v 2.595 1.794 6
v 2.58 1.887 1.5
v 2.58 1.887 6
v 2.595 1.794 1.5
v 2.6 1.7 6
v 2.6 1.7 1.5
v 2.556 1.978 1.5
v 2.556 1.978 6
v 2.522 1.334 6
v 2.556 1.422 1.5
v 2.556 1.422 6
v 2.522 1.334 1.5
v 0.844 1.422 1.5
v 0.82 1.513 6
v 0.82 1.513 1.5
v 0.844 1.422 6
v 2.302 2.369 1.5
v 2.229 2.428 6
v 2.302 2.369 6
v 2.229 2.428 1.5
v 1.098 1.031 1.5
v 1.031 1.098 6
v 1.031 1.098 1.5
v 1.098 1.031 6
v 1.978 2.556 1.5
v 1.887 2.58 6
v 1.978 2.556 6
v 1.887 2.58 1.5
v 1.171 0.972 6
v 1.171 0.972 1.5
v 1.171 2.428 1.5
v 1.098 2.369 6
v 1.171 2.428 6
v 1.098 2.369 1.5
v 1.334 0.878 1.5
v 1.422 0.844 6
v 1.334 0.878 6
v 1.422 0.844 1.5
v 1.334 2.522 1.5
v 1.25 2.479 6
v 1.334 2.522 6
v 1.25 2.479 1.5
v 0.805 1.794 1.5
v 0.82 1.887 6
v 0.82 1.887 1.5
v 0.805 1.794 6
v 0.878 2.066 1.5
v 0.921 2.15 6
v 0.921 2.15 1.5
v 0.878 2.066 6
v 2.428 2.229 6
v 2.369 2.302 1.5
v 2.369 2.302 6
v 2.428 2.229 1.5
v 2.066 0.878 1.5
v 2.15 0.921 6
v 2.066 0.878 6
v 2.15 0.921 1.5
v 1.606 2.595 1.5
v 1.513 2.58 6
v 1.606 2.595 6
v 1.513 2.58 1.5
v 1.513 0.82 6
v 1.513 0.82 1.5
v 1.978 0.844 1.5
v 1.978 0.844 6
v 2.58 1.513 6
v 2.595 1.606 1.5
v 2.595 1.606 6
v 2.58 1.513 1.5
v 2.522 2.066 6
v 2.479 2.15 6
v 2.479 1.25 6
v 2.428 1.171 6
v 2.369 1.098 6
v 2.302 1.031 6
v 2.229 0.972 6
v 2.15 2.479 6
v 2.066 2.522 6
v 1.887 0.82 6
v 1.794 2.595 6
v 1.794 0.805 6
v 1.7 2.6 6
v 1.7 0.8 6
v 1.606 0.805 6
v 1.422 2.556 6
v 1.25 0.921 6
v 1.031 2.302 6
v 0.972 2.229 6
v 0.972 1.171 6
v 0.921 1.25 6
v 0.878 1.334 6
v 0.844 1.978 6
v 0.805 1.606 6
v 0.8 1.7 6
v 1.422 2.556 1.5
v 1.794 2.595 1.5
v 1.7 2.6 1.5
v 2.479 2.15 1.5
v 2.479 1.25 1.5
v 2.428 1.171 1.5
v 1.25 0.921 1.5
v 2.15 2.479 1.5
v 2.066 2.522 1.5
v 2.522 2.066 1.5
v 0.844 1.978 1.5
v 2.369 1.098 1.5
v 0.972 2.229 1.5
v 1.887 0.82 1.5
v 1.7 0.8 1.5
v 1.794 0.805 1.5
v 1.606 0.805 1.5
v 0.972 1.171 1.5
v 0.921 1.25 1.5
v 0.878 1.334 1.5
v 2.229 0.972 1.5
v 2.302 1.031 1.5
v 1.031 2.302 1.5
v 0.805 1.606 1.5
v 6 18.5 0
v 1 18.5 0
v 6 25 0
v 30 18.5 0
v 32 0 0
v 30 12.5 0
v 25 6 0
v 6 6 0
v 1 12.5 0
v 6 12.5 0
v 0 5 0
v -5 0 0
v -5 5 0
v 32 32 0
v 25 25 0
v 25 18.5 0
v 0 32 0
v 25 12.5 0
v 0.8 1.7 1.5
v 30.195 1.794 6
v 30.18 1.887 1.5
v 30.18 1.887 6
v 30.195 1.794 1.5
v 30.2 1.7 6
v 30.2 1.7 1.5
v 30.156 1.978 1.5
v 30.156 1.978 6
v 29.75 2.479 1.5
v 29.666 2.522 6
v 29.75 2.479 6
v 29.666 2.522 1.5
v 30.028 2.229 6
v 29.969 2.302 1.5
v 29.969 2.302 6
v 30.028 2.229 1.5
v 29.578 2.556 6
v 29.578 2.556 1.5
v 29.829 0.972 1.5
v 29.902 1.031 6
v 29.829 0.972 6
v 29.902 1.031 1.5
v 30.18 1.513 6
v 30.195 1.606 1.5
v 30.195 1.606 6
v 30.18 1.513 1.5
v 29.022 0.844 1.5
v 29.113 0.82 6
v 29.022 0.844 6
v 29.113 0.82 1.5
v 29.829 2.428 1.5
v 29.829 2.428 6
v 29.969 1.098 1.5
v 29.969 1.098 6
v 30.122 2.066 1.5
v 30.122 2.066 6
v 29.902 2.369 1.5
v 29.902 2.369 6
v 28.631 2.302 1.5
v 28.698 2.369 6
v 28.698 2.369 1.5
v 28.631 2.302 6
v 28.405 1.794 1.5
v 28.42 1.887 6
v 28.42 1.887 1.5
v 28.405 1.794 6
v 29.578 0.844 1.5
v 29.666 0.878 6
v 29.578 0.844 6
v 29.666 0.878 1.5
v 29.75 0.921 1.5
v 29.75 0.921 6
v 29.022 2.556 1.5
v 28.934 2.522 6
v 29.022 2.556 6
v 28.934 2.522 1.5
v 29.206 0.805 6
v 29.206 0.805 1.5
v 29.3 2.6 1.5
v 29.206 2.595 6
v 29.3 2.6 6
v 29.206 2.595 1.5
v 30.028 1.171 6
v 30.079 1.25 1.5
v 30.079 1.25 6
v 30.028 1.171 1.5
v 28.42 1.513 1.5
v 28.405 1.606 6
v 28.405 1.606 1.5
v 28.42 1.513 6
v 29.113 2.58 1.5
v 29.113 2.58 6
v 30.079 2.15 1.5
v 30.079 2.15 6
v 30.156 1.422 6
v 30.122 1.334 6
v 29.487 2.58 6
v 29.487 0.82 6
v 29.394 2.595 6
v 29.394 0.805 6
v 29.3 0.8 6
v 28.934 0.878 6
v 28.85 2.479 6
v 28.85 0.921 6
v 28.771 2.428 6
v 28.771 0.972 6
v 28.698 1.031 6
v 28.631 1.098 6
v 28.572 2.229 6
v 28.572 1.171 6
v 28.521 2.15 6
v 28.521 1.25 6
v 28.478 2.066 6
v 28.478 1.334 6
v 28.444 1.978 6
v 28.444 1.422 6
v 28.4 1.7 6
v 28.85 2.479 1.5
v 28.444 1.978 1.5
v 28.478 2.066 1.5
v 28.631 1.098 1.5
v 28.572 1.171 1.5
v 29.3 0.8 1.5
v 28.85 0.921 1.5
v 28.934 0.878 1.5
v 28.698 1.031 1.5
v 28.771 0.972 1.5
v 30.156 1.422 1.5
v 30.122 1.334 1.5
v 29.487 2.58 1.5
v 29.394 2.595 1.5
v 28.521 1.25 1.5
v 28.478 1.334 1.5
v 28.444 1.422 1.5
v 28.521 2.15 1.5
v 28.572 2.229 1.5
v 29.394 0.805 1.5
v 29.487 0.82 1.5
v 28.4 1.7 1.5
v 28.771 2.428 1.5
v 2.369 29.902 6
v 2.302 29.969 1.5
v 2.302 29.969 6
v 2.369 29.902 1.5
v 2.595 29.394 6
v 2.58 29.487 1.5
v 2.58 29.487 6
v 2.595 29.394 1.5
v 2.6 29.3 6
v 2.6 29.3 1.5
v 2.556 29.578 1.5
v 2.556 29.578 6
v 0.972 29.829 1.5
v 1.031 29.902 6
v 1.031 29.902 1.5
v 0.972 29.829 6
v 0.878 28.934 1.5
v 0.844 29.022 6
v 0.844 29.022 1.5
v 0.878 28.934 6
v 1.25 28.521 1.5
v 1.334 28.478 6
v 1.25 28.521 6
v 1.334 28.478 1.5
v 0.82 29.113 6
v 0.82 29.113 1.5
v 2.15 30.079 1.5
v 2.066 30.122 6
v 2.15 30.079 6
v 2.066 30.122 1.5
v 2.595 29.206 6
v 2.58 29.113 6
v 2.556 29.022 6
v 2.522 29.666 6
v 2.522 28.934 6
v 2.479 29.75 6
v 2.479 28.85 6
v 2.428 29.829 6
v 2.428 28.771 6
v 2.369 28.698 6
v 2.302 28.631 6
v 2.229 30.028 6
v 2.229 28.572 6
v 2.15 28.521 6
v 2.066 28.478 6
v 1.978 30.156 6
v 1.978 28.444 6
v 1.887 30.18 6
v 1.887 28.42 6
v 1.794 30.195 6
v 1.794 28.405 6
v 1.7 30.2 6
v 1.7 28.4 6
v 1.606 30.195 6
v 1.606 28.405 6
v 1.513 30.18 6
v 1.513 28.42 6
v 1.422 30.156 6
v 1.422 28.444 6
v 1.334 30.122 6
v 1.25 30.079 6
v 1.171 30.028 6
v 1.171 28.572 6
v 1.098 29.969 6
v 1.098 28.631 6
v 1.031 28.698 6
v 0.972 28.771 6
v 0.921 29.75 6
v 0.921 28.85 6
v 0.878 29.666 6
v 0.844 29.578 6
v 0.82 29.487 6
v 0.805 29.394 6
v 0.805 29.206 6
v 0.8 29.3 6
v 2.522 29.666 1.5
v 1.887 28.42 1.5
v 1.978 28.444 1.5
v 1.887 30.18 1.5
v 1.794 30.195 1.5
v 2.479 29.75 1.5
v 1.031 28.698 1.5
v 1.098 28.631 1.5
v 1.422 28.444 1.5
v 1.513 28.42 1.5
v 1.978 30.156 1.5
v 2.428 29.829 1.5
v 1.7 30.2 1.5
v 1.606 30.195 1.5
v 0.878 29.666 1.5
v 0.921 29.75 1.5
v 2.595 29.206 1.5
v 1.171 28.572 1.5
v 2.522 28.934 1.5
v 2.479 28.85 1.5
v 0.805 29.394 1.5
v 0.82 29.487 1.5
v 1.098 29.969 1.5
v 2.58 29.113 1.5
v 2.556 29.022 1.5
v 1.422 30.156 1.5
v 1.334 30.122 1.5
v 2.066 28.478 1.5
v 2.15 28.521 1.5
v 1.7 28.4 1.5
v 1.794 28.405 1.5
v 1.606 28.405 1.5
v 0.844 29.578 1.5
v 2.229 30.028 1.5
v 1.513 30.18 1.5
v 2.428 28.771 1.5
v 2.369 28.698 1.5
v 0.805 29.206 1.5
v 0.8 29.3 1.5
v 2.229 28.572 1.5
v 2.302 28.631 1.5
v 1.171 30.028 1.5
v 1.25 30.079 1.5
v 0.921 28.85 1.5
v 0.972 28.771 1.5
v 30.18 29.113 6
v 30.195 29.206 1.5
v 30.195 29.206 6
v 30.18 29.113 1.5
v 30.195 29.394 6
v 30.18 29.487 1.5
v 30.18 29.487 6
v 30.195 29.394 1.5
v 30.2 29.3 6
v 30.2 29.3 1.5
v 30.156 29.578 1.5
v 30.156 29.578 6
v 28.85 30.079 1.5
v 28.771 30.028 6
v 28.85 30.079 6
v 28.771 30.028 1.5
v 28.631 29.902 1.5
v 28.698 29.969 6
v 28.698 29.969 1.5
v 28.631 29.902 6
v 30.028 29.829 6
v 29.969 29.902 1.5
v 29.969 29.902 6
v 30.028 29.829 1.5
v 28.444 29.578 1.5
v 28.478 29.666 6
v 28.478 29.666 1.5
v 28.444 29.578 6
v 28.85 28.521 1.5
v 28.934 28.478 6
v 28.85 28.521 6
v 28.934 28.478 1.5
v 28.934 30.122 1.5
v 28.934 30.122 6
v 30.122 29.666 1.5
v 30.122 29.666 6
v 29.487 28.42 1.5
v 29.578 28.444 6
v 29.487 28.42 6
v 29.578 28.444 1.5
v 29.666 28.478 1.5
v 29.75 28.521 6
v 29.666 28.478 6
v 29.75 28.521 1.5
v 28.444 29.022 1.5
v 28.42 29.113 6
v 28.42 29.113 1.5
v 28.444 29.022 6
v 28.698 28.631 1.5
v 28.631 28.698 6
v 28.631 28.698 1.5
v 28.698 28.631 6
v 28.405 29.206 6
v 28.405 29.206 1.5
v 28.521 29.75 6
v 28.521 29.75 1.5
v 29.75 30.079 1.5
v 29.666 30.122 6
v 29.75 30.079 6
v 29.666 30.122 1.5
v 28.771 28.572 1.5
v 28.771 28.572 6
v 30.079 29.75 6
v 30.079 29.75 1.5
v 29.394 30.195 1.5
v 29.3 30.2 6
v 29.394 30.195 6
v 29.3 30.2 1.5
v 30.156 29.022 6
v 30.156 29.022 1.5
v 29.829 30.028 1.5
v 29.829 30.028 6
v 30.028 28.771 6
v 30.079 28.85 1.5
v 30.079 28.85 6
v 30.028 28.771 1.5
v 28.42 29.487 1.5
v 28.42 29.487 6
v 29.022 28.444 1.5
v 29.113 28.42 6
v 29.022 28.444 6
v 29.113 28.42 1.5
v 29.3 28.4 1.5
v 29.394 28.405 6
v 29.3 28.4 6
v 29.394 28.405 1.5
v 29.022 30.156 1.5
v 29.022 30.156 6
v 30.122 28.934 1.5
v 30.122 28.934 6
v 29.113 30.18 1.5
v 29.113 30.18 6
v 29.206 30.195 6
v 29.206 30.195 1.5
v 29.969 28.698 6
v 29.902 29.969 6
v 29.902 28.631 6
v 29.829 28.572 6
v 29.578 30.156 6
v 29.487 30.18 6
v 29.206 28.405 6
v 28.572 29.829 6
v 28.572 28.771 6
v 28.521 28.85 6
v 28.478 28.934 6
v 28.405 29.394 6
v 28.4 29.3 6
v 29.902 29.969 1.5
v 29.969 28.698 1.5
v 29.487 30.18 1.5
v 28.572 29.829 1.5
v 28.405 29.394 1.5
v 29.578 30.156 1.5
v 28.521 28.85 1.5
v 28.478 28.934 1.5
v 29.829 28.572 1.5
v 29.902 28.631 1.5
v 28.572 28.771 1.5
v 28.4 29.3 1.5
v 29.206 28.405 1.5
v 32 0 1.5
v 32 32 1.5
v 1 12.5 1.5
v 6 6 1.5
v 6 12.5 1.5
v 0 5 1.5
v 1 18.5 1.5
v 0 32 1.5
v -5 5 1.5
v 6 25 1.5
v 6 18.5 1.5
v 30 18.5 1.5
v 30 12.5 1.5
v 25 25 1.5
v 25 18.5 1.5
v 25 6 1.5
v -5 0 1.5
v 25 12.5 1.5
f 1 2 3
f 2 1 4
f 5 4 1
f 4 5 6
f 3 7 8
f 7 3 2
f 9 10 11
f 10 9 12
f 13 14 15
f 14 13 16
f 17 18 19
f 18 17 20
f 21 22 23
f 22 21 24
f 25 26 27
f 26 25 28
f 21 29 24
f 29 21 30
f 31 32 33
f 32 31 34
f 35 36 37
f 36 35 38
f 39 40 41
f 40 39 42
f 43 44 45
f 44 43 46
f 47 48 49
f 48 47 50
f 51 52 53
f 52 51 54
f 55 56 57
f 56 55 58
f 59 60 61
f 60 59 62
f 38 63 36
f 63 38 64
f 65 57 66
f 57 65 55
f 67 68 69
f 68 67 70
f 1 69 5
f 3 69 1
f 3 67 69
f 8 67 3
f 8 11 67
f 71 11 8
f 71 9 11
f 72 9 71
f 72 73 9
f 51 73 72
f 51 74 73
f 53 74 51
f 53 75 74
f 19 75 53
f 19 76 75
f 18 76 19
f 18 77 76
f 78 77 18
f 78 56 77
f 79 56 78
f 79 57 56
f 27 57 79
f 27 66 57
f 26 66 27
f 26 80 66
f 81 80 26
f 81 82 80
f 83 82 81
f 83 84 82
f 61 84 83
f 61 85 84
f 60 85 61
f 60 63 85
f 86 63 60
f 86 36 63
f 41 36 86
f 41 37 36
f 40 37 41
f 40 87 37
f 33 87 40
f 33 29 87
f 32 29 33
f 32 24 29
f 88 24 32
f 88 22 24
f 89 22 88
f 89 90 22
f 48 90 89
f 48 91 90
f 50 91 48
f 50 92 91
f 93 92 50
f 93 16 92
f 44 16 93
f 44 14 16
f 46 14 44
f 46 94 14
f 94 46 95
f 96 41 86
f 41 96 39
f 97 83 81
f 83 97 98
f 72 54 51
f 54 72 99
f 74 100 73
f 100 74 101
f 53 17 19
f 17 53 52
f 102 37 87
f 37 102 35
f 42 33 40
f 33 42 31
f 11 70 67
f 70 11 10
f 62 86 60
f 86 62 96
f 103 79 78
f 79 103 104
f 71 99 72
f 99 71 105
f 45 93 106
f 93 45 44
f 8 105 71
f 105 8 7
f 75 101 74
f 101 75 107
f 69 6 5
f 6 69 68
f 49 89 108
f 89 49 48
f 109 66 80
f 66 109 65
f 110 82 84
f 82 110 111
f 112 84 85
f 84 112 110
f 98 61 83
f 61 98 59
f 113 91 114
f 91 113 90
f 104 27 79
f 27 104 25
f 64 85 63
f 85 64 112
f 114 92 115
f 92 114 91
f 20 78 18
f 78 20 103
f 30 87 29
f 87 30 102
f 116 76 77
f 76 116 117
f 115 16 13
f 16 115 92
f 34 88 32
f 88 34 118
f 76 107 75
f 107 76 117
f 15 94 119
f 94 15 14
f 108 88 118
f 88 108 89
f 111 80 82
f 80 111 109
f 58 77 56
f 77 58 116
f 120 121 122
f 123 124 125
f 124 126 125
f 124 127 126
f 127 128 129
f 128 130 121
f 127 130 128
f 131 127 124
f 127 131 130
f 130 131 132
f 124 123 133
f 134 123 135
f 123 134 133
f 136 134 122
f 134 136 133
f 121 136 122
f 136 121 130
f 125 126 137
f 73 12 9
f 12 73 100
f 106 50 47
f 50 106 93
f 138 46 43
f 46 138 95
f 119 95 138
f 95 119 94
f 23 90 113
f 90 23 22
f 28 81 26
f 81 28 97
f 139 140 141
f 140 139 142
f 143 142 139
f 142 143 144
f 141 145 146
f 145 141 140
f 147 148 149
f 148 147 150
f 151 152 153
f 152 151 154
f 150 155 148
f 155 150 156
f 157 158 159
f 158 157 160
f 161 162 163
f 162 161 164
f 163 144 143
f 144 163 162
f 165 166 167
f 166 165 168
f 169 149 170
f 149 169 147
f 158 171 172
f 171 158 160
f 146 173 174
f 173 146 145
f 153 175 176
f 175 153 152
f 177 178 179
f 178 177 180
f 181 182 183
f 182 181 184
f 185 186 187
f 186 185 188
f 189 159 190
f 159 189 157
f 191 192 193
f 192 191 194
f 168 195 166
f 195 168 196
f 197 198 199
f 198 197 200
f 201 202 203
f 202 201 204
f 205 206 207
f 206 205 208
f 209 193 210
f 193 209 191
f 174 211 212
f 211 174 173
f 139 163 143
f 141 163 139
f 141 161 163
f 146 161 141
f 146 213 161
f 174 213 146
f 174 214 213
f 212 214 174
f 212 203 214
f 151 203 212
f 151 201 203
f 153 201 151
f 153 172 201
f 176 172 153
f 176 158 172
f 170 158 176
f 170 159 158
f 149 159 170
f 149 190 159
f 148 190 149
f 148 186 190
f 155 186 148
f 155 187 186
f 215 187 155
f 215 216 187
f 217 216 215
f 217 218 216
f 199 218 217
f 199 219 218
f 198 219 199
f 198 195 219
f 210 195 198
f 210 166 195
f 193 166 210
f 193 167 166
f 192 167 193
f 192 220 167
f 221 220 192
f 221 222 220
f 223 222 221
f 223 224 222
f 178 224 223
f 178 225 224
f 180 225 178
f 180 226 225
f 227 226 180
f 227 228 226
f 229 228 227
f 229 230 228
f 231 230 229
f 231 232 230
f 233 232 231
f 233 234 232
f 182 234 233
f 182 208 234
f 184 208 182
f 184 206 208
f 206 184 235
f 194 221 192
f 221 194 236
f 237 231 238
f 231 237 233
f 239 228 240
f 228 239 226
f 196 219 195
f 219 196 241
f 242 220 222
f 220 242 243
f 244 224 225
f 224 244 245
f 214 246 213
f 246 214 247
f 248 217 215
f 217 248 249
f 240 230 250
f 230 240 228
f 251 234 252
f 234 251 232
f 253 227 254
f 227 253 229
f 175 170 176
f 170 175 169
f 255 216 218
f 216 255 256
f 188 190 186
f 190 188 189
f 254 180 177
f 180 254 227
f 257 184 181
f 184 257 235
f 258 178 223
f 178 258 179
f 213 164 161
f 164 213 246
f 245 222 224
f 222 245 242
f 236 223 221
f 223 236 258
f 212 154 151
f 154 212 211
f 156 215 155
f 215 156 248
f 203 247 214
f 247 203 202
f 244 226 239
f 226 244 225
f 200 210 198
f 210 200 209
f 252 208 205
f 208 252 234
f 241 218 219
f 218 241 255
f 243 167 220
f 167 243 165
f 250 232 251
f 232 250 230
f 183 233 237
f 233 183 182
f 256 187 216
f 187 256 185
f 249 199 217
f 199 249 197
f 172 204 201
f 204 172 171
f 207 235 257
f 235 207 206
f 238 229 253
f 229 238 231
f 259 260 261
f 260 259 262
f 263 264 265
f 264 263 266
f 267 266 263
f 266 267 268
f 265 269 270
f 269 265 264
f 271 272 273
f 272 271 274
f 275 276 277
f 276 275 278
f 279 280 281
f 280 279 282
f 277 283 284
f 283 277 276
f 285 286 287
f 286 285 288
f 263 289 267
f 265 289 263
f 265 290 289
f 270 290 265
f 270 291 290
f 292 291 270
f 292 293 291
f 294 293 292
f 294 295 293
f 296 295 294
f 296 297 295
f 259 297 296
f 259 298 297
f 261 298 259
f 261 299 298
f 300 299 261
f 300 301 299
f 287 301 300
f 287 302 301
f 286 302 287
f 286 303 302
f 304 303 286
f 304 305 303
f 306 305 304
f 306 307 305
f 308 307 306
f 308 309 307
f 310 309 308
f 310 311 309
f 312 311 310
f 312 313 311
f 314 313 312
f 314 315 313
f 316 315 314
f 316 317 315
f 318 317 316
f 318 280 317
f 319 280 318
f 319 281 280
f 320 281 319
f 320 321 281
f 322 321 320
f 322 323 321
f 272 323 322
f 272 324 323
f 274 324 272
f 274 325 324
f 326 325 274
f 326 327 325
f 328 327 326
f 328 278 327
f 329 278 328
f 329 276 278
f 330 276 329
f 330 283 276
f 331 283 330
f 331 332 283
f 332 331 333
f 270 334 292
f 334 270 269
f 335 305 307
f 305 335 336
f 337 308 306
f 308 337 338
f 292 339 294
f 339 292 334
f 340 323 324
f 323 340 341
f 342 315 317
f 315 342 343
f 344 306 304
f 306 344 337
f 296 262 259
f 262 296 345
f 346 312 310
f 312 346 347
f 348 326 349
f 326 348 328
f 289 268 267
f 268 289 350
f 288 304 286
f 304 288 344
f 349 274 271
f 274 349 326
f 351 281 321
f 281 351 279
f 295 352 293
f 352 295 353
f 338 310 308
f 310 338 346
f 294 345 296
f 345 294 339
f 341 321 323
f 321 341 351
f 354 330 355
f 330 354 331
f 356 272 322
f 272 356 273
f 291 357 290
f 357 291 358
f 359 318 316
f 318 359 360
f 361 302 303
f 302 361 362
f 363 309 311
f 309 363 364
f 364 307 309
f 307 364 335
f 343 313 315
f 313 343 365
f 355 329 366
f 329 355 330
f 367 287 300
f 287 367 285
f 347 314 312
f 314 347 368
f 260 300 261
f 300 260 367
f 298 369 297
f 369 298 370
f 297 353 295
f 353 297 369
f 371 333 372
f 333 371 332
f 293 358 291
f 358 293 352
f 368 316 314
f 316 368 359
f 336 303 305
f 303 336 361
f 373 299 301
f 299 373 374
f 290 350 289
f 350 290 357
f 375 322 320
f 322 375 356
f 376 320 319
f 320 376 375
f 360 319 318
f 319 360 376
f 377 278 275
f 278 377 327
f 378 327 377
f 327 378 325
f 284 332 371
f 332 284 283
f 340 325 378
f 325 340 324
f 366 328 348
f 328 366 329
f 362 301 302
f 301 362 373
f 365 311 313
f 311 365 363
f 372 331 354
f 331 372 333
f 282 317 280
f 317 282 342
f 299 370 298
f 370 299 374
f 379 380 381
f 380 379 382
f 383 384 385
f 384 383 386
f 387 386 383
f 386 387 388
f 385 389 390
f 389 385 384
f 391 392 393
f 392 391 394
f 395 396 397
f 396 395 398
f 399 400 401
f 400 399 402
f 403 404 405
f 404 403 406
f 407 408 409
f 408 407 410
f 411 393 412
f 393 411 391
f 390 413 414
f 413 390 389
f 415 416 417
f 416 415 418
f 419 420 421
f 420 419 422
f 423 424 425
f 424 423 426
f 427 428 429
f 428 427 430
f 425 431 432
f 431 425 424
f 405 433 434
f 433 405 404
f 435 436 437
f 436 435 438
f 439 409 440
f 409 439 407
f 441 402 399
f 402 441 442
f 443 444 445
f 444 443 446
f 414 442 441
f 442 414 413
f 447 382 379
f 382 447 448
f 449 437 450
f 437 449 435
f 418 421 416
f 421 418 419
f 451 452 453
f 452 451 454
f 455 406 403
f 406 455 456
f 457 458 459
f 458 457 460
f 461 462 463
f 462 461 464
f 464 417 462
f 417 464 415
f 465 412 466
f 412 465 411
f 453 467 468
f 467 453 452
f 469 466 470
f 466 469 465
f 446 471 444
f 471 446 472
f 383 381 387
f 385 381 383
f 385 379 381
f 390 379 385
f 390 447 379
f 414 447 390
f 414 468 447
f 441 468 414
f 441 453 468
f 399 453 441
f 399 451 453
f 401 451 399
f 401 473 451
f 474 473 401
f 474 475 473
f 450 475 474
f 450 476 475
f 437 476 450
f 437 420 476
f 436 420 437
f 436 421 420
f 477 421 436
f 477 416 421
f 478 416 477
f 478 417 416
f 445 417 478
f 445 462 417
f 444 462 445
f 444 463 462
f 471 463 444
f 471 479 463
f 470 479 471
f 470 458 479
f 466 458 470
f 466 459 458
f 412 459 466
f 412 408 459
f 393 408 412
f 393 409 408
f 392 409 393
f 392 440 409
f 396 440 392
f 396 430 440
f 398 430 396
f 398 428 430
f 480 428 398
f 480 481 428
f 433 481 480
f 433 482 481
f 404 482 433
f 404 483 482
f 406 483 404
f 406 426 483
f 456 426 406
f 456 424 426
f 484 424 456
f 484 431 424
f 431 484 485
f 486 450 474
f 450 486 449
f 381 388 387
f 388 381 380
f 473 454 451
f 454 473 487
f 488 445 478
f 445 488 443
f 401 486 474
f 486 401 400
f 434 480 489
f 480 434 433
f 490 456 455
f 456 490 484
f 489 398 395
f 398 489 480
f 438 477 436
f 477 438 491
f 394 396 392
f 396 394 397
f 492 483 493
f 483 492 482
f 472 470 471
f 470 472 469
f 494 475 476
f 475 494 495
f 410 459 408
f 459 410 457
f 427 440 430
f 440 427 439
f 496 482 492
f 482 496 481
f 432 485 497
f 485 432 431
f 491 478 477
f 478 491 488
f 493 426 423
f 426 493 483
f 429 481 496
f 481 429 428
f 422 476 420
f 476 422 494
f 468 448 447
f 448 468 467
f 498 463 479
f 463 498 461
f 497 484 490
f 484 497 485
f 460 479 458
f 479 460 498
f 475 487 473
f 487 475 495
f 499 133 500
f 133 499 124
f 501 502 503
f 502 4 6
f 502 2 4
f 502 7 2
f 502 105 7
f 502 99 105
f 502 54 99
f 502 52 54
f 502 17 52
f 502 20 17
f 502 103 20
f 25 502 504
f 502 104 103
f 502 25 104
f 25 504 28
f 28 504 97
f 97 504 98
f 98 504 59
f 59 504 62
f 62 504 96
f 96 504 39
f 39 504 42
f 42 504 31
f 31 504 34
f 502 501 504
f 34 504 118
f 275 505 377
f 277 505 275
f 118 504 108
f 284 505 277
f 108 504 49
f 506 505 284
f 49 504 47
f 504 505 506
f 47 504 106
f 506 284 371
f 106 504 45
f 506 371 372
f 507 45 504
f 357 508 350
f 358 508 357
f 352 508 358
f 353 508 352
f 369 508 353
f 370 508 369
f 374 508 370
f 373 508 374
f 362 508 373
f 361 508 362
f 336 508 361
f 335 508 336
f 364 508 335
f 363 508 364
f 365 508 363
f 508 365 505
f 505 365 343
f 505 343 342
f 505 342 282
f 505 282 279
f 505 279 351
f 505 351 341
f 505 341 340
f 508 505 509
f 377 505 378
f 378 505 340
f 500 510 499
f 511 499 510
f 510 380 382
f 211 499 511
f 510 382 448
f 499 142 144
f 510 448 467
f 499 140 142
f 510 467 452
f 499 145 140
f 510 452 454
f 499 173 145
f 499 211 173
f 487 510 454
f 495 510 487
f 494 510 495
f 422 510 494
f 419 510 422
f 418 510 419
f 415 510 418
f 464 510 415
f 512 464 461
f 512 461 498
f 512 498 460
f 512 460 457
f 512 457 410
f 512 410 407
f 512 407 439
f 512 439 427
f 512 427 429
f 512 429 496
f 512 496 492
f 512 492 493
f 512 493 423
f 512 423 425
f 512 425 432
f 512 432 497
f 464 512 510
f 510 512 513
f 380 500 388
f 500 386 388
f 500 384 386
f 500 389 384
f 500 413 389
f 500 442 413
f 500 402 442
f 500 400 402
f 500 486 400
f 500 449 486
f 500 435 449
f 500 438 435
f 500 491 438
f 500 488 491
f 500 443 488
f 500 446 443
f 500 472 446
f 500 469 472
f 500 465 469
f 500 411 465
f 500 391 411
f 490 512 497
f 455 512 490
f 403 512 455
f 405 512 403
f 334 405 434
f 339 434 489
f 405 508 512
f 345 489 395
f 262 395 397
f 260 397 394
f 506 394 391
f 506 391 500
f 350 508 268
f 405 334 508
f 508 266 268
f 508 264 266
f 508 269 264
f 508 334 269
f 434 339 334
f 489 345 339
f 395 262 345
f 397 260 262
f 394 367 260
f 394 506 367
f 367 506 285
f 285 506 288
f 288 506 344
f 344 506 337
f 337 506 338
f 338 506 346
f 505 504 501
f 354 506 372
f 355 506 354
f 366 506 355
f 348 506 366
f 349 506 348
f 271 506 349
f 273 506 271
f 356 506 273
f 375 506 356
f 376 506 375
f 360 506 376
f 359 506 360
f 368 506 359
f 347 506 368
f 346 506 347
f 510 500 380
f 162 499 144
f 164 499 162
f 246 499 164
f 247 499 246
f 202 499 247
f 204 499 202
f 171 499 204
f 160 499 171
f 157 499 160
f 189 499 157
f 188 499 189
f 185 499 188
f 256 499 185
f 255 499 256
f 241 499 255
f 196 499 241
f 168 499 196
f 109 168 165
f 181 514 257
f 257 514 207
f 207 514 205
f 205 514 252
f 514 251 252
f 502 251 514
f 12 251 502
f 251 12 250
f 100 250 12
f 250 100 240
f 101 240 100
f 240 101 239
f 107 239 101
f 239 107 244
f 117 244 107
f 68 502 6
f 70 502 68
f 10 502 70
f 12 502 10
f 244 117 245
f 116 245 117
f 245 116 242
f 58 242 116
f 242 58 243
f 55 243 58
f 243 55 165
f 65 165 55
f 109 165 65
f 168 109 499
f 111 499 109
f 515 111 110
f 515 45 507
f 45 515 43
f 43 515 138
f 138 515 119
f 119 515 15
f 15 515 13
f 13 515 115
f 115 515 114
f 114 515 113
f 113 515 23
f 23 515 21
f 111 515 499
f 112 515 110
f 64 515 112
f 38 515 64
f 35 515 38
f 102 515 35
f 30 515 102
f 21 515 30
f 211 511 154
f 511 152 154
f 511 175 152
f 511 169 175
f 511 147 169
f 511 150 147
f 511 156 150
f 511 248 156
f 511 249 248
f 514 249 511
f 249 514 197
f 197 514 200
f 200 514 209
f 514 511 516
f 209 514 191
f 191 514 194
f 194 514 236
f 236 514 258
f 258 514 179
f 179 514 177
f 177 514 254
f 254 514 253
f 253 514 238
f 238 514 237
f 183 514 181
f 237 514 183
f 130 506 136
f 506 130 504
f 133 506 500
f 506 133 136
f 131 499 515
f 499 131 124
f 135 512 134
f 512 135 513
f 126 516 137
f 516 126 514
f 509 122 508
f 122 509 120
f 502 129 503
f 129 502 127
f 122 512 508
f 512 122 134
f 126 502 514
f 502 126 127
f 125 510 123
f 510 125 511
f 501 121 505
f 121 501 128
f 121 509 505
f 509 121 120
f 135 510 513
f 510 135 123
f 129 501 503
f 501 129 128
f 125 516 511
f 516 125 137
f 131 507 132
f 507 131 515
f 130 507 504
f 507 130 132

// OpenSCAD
module body() {
    cube([32, 32, 1.5]);
}

module camera_pin(xoffs = 0, yoffs = 0, zoffs = 0) {
    translate([xoffs, yoffs, zoffs]) {
        cylinder(d=1.8, h=6, $fn=60);
    }
}

module camera_adds(xoffs = 0, yoffs = 0, zoffs = 0) {
    translate([xoffs, yoffs, zoffs]) {
        camera_pin(1.7, 1.7, 0);
        camera_pin(1.7+1.8+25.8, 1.7, 0);
        camera_pin(1.7, 1.7+1.8+25.8, 0);
        camera_pin(1.7+1.8+25.8, 1.7+1.8+25.8, 0);
    }
}

module camera_removes(xoffs = 0, yoffs = 0, zoffs = 0) {
    translate([xoffs, yoffs, zoffs]) {
        /*
        translate([15.5, 15.5, -10]) {
            cylinder(d=16, h=20, $fn=180);
        }
        */
        translate([6, 6, -10]) {
            cube([19, 19, 20]);
        }
        translate([1, 12.5, -10]) {
            cube([29, 6, 20]);
        }
    }
}

difference() {
    union() {
        body();
        camera_adds();
    }
    camera_removes();
}

translate([-5, 0, 0]) {
    cube([5, 5, 1.5]);
}
